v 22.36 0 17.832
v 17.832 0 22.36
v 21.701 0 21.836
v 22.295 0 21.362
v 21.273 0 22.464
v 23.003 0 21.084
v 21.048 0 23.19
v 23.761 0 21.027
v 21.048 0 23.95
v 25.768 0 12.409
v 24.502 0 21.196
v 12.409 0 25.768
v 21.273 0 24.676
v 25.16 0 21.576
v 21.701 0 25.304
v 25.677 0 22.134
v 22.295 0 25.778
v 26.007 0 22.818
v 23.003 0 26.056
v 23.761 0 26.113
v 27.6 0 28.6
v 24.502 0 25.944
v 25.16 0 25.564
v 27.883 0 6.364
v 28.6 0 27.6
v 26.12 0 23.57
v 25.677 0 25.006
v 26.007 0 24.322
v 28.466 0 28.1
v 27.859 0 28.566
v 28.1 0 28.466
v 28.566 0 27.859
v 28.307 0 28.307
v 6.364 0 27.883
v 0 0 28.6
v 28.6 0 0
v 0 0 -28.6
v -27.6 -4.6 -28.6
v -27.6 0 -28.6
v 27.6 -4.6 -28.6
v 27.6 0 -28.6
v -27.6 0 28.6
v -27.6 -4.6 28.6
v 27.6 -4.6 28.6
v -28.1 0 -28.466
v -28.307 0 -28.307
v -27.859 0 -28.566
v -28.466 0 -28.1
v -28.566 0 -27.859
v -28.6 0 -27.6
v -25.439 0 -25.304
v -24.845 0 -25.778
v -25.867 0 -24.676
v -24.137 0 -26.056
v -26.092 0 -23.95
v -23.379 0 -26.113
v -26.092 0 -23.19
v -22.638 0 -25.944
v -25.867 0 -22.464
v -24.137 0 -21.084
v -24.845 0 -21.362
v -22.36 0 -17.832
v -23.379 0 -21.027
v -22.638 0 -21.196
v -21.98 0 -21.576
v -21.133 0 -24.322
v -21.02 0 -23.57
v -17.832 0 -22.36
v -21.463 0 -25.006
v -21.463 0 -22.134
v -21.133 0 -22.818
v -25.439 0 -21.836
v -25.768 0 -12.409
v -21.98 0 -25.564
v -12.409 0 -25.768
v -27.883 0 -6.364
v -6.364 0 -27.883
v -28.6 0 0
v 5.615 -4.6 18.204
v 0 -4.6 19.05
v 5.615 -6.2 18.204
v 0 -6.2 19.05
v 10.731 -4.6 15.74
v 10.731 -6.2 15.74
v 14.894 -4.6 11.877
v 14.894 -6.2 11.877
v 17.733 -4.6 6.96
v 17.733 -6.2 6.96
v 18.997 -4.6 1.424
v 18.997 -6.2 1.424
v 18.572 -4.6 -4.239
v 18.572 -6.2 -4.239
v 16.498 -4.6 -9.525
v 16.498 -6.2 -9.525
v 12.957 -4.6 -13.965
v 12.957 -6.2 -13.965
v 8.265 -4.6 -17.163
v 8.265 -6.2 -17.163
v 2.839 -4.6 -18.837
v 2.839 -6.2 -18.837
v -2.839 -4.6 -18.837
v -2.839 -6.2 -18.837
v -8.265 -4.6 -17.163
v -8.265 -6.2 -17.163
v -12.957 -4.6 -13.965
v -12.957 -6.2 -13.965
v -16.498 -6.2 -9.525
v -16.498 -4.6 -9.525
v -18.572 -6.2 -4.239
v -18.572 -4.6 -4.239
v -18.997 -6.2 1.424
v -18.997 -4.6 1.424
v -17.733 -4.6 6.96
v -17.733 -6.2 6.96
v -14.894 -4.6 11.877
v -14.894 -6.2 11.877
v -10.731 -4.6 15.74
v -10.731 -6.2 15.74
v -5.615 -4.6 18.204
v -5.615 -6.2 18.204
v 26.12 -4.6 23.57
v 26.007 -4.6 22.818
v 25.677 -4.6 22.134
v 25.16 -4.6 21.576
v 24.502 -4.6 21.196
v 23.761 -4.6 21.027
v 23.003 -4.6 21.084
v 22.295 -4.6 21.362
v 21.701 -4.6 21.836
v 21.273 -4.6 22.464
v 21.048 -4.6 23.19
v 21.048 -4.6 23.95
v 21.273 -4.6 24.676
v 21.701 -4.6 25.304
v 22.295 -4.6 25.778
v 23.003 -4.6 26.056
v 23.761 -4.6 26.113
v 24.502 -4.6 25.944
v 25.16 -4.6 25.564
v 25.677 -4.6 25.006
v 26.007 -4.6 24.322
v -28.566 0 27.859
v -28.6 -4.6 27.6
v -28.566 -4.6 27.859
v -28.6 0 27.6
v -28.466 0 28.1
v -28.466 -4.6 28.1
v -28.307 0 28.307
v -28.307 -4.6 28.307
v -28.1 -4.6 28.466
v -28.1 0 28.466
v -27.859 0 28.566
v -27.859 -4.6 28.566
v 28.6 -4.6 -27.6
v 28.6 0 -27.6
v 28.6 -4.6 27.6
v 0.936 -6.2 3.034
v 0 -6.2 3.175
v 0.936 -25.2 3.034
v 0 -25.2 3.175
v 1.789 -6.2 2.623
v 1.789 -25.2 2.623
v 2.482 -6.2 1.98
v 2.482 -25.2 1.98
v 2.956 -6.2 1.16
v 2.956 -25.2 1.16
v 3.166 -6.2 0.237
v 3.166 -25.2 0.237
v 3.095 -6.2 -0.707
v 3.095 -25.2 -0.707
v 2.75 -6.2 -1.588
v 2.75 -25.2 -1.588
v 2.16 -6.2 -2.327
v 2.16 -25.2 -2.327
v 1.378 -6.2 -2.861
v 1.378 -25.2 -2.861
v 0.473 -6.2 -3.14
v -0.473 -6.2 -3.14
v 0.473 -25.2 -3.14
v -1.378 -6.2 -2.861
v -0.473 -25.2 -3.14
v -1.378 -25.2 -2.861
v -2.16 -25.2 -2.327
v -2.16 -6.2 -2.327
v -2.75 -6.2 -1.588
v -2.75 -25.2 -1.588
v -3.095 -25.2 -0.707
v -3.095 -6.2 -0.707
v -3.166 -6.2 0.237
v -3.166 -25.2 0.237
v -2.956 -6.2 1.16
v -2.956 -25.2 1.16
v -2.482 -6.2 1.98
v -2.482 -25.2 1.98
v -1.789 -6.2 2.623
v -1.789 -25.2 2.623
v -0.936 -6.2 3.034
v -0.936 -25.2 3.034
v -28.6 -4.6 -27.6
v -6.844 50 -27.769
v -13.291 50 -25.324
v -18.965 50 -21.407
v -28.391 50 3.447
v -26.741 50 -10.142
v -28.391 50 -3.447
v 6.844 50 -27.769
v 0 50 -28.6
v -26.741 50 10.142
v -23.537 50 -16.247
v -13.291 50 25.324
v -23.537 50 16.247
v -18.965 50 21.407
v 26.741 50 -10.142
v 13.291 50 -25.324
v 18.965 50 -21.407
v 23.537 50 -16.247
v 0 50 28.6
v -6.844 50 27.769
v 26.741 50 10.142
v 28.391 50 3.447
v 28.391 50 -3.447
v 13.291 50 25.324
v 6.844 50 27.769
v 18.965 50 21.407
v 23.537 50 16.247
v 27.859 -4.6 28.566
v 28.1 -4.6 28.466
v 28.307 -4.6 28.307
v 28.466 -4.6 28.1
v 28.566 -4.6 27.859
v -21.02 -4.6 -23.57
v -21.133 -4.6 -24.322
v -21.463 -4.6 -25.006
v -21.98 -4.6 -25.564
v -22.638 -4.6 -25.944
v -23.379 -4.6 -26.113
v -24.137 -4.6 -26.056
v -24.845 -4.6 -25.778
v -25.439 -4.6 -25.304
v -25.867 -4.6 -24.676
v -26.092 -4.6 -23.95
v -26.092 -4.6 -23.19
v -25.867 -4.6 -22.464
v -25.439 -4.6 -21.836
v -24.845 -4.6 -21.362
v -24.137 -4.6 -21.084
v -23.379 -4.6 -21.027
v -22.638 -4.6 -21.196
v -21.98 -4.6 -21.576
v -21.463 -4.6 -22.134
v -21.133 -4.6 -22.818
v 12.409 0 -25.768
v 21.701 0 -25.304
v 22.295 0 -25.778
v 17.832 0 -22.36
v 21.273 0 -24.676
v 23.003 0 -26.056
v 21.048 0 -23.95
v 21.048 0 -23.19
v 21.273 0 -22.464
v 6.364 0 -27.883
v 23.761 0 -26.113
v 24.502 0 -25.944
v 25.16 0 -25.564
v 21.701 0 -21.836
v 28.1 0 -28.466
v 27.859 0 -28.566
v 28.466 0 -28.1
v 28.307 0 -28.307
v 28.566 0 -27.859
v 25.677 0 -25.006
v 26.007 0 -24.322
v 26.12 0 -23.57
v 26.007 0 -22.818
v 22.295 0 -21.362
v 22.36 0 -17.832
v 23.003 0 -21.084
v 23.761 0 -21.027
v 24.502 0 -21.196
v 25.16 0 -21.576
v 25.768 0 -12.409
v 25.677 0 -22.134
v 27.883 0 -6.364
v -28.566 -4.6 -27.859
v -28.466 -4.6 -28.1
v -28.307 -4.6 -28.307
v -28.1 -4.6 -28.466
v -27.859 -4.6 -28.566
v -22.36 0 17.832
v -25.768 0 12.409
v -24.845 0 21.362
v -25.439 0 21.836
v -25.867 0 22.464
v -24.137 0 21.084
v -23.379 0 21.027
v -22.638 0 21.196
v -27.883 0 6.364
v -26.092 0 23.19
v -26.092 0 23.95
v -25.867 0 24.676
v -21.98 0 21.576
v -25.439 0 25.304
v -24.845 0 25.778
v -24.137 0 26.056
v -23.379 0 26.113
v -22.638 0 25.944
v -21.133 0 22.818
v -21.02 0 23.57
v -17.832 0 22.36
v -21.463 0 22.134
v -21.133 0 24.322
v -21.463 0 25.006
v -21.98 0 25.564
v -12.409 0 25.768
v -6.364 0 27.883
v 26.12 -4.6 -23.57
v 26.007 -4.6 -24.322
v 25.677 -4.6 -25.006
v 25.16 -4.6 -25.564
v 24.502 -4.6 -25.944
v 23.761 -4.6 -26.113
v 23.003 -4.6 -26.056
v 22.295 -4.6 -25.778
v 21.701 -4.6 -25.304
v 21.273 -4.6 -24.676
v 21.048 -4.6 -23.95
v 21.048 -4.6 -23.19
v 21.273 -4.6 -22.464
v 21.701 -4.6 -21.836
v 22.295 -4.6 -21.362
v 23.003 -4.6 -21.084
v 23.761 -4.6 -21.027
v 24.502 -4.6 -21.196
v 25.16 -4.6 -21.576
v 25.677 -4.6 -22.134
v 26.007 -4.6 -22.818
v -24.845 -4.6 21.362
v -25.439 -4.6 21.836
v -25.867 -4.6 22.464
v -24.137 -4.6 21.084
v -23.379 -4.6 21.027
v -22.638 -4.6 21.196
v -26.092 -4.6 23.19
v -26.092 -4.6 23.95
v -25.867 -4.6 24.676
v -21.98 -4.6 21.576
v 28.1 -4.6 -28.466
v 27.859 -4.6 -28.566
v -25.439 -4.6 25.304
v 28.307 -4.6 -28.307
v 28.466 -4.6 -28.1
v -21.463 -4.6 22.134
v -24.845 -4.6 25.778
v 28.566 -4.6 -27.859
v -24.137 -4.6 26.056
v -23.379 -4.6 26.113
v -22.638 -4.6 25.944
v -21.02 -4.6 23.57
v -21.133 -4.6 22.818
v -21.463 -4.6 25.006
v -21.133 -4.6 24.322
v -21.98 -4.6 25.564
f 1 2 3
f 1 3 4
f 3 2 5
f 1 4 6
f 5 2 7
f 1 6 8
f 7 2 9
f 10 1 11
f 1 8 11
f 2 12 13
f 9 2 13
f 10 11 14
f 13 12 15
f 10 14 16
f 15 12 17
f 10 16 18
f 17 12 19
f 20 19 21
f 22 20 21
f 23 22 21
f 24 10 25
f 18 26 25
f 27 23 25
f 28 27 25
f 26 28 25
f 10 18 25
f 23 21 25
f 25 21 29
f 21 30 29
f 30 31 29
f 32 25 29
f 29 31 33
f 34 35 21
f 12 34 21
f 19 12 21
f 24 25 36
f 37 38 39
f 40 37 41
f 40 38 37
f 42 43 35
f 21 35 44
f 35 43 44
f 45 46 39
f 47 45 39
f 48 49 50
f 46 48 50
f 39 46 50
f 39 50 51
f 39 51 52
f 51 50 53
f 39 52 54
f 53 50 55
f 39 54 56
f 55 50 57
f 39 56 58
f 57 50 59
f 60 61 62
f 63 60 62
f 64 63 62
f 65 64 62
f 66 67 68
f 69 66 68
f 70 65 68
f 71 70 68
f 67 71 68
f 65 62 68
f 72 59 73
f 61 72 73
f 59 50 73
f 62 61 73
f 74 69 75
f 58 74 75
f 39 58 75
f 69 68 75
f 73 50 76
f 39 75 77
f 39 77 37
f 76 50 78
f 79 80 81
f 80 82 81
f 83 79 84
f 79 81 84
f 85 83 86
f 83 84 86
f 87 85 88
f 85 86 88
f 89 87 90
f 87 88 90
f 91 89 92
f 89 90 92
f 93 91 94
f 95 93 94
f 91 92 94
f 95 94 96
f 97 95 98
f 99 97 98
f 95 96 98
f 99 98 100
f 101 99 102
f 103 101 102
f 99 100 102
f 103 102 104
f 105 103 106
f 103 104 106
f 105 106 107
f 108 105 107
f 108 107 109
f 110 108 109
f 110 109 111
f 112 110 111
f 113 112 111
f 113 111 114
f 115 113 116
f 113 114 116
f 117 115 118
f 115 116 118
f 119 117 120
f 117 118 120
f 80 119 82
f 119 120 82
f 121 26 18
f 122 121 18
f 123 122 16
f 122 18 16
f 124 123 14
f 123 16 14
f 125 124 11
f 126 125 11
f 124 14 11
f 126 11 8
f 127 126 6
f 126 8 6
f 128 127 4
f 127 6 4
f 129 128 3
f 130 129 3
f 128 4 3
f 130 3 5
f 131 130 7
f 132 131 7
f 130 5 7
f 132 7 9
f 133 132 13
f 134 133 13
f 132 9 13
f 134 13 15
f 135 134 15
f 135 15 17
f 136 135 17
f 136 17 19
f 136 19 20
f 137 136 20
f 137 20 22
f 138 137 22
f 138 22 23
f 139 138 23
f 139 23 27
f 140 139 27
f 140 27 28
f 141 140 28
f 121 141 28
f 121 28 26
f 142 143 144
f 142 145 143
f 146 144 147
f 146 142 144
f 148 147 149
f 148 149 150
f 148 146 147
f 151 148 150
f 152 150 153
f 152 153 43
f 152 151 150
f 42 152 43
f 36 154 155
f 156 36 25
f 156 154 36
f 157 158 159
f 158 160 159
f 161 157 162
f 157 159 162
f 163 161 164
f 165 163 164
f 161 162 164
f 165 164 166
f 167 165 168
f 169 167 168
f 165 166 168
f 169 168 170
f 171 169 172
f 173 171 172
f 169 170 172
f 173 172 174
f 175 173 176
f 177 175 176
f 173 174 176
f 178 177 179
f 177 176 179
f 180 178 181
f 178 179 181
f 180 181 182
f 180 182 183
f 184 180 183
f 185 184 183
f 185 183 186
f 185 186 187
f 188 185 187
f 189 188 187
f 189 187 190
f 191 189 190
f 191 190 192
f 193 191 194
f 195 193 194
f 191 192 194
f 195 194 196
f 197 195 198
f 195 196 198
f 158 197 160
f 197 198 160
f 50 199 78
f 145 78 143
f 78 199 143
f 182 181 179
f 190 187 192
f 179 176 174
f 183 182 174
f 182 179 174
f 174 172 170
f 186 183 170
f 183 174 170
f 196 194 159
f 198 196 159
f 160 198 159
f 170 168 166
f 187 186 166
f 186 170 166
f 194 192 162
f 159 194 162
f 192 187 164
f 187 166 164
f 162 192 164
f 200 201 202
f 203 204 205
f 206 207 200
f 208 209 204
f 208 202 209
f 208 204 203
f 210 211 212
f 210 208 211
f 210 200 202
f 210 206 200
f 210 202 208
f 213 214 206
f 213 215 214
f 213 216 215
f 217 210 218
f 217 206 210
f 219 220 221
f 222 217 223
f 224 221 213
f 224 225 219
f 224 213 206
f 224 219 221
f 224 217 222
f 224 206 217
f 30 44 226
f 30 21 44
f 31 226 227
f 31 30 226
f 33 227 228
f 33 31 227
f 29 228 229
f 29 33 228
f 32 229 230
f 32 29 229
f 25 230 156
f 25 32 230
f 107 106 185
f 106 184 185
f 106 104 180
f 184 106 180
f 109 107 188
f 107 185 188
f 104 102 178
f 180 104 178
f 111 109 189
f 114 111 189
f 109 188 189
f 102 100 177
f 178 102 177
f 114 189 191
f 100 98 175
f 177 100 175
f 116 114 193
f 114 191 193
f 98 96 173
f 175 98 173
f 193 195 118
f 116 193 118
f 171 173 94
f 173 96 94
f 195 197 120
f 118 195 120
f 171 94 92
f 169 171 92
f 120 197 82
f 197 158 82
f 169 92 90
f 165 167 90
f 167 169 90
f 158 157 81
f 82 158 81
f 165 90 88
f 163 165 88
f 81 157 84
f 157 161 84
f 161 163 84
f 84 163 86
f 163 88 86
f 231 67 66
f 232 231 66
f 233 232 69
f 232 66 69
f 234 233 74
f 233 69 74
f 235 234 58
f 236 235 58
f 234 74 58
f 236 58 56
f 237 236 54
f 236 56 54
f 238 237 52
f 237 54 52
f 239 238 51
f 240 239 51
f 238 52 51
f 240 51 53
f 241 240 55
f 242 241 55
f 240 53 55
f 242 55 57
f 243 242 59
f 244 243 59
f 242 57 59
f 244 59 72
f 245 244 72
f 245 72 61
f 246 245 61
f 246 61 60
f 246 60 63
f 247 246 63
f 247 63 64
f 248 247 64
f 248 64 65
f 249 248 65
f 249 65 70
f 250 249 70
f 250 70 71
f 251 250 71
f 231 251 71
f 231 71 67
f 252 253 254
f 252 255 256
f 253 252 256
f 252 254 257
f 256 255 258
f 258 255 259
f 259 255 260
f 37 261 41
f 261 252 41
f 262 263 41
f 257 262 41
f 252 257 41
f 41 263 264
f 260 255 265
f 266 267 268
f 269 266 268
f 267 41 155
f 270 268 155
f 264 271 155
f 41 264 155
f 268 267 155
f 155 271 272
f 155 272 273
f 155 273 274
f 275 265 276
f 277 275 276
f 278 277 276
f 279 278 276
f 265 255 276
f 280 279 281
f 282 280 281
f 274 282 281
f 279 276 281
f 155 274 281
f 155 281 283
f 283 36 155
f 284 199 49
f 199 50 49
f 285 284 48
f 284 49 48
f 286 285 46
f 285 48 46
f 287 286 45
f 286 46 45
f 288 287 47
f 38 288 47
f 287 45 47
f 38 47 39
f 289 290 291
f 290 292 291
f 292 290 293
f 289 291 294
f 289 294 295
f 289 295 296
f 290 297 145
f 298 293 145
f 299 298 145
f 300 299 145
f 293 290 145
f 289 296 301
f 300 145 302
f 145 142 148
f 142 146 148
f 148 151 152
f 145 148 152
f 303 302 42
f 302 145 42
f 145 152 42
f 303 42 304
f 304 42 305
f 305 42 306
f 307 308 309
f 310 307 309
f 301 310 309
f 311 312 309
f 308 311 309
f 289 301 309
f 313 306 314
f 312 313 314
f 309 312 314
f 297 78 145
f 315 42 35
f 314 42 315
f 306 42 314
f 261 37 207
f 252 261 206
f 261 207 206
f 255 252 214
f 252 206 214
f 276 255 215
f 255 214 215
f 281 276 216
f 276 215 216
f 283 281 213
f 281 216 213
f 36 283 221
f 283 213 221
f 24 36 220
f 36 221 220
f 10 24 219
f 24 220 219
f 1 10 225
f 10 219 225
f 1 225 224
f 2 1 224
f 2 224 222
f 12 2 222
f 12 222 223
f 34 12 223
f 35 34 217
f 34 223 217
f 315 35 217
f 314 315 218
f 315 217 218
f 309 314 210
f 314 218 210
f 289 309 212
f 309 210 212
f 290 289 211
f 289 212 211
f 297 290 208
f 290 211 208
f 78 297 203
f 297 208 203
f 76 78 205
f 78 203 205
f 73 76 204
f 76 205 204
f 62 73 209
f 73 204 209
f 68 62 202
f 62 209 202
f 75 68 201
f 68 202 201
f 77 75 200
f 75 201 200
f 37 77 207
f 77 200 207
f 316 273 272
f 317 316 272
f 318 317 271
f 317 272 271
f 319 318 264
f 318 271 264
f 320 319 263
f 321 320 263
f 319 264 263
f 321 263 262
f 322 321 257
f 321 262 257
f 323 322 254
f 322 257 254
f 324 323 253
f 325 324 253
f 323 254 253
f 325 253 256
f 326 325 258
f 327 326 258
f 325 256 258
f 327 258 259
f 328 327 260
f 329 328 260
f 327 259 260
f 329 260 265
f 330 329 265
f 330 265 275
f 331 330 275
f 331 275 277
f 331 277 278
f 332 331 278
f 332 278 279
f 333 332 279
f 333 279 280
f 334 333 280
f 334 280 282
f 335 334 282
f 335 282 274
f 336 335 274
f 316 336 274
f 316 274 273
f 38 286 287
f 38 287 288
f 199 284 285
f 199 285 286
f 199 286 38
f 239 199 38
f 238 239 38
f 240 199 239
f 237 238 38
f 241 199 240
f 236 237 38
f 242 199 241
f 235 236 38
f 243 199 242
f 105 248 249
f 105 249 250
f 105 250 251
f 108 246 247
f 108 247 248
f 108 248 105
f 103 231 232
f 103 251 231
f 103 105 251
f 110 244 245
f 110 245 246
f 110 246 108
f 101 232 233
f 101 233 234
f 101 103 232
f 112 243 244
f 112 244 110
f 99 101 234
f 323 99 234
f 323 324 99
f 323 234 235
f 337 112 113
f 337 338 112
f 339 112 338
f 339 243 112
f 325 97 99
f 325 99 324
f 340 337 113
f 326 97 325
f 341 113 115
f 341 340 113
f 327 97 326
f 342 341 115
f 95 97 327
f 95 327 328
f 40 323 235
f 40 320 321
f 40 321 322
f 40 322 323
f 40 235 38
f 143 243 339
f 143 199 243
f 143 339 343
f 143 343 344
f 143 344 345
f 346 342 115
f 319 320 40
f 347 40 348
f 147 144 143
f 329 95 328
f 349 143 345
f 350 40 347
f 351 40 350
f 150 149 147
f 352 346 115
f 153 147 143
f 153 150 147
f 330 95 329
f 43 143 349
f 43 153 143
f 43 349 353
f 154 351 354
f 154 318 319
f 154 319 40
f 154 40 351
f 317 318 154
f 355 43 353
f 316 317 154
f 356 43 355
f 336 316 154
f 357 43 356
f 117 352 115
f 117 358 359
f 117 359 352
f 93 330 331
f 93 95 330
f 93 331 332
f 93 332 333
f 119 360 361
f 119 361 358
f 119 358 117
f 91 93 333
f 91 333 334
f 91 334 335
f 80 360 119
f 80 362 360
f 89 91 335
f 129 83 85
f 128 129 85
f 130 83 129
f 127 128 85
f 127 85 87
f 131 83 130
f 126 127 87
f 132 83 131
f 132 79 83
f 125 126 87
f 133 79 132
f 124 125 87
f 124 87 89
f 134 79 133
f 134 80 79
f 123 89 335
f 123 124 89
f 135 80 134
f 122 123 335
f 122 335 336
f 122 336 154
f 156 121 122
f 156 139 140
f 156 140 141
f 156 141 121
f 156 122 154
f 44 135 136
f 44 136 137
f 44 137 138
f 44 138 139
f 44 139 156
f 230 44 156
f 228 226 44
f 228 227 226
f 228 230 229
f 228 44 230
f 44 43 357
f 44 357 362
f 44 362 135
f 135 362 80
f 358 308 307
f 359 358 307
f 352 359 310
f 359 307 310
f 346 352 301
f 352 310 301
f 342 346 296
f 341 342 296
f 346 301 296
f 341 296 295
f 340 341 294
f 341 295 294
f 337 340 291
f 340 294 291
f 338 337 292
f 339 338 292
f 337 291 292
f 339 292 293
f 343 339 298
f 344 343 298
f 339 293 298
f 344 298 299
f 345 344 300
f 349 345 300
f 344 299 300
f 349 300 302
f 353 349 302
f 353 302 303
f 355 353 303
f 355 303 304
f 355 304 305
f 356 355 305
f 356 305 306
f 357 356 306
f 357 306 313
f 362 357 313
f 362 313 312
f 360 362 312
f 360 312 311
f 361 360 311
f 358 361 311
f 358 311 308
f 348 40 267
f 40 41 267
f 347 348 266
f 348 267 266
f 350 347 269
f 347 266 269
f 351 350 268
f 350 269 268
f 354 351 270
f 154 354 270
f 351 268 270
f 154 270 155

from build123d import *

# Parameters (mm, degrees)
SKETCH_1_W                  = 57.2
SKETCH_1_H                  = 57.2
EXTRUDE_1_DEPTH             = 4.6
SKETCH_2_W                  = 28.6
SKETCH_2_H                  = 50
HOLE_WIZARD_5_1_5_1_1_D     = 5.1
HOLE_WIZARD_5_1_5_1_1_DEPTH = 54.6
FILLET_1_R                  = 1


with BuildPart() as part:
    # Эскиз1 → Бобышка-Вытянуть1 (new body)
    with BuildSketch(Plane.XZ.offset(4.6)):
        Rectangle(SKETCH_1_W, SKETCH_1_H)
    extrude(amount=-EXTRUDE_1_DEPTH)

    # Эскиз2 → Повернуть1 (revolve)
    with BuildSketch(Plane.XY, mode=Mode.PRIVATE) as revolve_1_sk:
        with Locations((14.3, 25)):
            Rectangle(SKETCH_2_W, SKETCH_2_H)
    revolve(revolve_1_sk.sketch.rotate(Axis((0, 50, 0), (0, -1, 0)), 270), axis=Axis((0, 50, 0), (0, -1, 0)))

    # Эскиз3 → Повернуть2 (revolve)
    with BuildSketch(Plane(origin=(0, 0, 0), x_dir=(-1, 0, 0), z_dir=(0, 0, -1)), mode=Mode.PRIVATE) as revolve_2_sk:
        Polygon((-3.175, -25.2), (0, -25.2), (0, -4.6), (-19.05, -4.6), (-19.05, -6.2), (-3.175, -6.2), align=None)
    revolve(revolve_2_sk.sketch.rotate(Axis((0, -25.2, 0), (0, 1, 0)), 270), axis=Axis((0, -25.2, 0), (0, 1, 0)))

    # Диаметр отверстия Ø5.1 (5.1)1
    with Locations(Plane(origin=(0, -4.6, 0), x_dir=(-1, 0, 0), z_dir=(0, -1, 0))):
        with Locations((23.57, 23.57), (23.57, -23.57), (-23.57, -23.57), (-23.57, 23.57)):
            Hole(HOLE_WIZARD_5_1_5_1_1_D / 2, depth=HOLE_WIZARD_5_1_5_1_1_DEPTH)

    # Скругление1
    fillet_1_edges = [part.edges().sort_by_distance(p)[0] for p in [
        (28.6, -2.3, 28.6),
        (28.6, -2.3, -28.6),
        (-28.6, -2.3, -28.6),
        (-28.6, -2.3, 28.6),
    ]]
    fillet(fillet_1_edges, radius=FILLET_1_R)


solid = part.part
